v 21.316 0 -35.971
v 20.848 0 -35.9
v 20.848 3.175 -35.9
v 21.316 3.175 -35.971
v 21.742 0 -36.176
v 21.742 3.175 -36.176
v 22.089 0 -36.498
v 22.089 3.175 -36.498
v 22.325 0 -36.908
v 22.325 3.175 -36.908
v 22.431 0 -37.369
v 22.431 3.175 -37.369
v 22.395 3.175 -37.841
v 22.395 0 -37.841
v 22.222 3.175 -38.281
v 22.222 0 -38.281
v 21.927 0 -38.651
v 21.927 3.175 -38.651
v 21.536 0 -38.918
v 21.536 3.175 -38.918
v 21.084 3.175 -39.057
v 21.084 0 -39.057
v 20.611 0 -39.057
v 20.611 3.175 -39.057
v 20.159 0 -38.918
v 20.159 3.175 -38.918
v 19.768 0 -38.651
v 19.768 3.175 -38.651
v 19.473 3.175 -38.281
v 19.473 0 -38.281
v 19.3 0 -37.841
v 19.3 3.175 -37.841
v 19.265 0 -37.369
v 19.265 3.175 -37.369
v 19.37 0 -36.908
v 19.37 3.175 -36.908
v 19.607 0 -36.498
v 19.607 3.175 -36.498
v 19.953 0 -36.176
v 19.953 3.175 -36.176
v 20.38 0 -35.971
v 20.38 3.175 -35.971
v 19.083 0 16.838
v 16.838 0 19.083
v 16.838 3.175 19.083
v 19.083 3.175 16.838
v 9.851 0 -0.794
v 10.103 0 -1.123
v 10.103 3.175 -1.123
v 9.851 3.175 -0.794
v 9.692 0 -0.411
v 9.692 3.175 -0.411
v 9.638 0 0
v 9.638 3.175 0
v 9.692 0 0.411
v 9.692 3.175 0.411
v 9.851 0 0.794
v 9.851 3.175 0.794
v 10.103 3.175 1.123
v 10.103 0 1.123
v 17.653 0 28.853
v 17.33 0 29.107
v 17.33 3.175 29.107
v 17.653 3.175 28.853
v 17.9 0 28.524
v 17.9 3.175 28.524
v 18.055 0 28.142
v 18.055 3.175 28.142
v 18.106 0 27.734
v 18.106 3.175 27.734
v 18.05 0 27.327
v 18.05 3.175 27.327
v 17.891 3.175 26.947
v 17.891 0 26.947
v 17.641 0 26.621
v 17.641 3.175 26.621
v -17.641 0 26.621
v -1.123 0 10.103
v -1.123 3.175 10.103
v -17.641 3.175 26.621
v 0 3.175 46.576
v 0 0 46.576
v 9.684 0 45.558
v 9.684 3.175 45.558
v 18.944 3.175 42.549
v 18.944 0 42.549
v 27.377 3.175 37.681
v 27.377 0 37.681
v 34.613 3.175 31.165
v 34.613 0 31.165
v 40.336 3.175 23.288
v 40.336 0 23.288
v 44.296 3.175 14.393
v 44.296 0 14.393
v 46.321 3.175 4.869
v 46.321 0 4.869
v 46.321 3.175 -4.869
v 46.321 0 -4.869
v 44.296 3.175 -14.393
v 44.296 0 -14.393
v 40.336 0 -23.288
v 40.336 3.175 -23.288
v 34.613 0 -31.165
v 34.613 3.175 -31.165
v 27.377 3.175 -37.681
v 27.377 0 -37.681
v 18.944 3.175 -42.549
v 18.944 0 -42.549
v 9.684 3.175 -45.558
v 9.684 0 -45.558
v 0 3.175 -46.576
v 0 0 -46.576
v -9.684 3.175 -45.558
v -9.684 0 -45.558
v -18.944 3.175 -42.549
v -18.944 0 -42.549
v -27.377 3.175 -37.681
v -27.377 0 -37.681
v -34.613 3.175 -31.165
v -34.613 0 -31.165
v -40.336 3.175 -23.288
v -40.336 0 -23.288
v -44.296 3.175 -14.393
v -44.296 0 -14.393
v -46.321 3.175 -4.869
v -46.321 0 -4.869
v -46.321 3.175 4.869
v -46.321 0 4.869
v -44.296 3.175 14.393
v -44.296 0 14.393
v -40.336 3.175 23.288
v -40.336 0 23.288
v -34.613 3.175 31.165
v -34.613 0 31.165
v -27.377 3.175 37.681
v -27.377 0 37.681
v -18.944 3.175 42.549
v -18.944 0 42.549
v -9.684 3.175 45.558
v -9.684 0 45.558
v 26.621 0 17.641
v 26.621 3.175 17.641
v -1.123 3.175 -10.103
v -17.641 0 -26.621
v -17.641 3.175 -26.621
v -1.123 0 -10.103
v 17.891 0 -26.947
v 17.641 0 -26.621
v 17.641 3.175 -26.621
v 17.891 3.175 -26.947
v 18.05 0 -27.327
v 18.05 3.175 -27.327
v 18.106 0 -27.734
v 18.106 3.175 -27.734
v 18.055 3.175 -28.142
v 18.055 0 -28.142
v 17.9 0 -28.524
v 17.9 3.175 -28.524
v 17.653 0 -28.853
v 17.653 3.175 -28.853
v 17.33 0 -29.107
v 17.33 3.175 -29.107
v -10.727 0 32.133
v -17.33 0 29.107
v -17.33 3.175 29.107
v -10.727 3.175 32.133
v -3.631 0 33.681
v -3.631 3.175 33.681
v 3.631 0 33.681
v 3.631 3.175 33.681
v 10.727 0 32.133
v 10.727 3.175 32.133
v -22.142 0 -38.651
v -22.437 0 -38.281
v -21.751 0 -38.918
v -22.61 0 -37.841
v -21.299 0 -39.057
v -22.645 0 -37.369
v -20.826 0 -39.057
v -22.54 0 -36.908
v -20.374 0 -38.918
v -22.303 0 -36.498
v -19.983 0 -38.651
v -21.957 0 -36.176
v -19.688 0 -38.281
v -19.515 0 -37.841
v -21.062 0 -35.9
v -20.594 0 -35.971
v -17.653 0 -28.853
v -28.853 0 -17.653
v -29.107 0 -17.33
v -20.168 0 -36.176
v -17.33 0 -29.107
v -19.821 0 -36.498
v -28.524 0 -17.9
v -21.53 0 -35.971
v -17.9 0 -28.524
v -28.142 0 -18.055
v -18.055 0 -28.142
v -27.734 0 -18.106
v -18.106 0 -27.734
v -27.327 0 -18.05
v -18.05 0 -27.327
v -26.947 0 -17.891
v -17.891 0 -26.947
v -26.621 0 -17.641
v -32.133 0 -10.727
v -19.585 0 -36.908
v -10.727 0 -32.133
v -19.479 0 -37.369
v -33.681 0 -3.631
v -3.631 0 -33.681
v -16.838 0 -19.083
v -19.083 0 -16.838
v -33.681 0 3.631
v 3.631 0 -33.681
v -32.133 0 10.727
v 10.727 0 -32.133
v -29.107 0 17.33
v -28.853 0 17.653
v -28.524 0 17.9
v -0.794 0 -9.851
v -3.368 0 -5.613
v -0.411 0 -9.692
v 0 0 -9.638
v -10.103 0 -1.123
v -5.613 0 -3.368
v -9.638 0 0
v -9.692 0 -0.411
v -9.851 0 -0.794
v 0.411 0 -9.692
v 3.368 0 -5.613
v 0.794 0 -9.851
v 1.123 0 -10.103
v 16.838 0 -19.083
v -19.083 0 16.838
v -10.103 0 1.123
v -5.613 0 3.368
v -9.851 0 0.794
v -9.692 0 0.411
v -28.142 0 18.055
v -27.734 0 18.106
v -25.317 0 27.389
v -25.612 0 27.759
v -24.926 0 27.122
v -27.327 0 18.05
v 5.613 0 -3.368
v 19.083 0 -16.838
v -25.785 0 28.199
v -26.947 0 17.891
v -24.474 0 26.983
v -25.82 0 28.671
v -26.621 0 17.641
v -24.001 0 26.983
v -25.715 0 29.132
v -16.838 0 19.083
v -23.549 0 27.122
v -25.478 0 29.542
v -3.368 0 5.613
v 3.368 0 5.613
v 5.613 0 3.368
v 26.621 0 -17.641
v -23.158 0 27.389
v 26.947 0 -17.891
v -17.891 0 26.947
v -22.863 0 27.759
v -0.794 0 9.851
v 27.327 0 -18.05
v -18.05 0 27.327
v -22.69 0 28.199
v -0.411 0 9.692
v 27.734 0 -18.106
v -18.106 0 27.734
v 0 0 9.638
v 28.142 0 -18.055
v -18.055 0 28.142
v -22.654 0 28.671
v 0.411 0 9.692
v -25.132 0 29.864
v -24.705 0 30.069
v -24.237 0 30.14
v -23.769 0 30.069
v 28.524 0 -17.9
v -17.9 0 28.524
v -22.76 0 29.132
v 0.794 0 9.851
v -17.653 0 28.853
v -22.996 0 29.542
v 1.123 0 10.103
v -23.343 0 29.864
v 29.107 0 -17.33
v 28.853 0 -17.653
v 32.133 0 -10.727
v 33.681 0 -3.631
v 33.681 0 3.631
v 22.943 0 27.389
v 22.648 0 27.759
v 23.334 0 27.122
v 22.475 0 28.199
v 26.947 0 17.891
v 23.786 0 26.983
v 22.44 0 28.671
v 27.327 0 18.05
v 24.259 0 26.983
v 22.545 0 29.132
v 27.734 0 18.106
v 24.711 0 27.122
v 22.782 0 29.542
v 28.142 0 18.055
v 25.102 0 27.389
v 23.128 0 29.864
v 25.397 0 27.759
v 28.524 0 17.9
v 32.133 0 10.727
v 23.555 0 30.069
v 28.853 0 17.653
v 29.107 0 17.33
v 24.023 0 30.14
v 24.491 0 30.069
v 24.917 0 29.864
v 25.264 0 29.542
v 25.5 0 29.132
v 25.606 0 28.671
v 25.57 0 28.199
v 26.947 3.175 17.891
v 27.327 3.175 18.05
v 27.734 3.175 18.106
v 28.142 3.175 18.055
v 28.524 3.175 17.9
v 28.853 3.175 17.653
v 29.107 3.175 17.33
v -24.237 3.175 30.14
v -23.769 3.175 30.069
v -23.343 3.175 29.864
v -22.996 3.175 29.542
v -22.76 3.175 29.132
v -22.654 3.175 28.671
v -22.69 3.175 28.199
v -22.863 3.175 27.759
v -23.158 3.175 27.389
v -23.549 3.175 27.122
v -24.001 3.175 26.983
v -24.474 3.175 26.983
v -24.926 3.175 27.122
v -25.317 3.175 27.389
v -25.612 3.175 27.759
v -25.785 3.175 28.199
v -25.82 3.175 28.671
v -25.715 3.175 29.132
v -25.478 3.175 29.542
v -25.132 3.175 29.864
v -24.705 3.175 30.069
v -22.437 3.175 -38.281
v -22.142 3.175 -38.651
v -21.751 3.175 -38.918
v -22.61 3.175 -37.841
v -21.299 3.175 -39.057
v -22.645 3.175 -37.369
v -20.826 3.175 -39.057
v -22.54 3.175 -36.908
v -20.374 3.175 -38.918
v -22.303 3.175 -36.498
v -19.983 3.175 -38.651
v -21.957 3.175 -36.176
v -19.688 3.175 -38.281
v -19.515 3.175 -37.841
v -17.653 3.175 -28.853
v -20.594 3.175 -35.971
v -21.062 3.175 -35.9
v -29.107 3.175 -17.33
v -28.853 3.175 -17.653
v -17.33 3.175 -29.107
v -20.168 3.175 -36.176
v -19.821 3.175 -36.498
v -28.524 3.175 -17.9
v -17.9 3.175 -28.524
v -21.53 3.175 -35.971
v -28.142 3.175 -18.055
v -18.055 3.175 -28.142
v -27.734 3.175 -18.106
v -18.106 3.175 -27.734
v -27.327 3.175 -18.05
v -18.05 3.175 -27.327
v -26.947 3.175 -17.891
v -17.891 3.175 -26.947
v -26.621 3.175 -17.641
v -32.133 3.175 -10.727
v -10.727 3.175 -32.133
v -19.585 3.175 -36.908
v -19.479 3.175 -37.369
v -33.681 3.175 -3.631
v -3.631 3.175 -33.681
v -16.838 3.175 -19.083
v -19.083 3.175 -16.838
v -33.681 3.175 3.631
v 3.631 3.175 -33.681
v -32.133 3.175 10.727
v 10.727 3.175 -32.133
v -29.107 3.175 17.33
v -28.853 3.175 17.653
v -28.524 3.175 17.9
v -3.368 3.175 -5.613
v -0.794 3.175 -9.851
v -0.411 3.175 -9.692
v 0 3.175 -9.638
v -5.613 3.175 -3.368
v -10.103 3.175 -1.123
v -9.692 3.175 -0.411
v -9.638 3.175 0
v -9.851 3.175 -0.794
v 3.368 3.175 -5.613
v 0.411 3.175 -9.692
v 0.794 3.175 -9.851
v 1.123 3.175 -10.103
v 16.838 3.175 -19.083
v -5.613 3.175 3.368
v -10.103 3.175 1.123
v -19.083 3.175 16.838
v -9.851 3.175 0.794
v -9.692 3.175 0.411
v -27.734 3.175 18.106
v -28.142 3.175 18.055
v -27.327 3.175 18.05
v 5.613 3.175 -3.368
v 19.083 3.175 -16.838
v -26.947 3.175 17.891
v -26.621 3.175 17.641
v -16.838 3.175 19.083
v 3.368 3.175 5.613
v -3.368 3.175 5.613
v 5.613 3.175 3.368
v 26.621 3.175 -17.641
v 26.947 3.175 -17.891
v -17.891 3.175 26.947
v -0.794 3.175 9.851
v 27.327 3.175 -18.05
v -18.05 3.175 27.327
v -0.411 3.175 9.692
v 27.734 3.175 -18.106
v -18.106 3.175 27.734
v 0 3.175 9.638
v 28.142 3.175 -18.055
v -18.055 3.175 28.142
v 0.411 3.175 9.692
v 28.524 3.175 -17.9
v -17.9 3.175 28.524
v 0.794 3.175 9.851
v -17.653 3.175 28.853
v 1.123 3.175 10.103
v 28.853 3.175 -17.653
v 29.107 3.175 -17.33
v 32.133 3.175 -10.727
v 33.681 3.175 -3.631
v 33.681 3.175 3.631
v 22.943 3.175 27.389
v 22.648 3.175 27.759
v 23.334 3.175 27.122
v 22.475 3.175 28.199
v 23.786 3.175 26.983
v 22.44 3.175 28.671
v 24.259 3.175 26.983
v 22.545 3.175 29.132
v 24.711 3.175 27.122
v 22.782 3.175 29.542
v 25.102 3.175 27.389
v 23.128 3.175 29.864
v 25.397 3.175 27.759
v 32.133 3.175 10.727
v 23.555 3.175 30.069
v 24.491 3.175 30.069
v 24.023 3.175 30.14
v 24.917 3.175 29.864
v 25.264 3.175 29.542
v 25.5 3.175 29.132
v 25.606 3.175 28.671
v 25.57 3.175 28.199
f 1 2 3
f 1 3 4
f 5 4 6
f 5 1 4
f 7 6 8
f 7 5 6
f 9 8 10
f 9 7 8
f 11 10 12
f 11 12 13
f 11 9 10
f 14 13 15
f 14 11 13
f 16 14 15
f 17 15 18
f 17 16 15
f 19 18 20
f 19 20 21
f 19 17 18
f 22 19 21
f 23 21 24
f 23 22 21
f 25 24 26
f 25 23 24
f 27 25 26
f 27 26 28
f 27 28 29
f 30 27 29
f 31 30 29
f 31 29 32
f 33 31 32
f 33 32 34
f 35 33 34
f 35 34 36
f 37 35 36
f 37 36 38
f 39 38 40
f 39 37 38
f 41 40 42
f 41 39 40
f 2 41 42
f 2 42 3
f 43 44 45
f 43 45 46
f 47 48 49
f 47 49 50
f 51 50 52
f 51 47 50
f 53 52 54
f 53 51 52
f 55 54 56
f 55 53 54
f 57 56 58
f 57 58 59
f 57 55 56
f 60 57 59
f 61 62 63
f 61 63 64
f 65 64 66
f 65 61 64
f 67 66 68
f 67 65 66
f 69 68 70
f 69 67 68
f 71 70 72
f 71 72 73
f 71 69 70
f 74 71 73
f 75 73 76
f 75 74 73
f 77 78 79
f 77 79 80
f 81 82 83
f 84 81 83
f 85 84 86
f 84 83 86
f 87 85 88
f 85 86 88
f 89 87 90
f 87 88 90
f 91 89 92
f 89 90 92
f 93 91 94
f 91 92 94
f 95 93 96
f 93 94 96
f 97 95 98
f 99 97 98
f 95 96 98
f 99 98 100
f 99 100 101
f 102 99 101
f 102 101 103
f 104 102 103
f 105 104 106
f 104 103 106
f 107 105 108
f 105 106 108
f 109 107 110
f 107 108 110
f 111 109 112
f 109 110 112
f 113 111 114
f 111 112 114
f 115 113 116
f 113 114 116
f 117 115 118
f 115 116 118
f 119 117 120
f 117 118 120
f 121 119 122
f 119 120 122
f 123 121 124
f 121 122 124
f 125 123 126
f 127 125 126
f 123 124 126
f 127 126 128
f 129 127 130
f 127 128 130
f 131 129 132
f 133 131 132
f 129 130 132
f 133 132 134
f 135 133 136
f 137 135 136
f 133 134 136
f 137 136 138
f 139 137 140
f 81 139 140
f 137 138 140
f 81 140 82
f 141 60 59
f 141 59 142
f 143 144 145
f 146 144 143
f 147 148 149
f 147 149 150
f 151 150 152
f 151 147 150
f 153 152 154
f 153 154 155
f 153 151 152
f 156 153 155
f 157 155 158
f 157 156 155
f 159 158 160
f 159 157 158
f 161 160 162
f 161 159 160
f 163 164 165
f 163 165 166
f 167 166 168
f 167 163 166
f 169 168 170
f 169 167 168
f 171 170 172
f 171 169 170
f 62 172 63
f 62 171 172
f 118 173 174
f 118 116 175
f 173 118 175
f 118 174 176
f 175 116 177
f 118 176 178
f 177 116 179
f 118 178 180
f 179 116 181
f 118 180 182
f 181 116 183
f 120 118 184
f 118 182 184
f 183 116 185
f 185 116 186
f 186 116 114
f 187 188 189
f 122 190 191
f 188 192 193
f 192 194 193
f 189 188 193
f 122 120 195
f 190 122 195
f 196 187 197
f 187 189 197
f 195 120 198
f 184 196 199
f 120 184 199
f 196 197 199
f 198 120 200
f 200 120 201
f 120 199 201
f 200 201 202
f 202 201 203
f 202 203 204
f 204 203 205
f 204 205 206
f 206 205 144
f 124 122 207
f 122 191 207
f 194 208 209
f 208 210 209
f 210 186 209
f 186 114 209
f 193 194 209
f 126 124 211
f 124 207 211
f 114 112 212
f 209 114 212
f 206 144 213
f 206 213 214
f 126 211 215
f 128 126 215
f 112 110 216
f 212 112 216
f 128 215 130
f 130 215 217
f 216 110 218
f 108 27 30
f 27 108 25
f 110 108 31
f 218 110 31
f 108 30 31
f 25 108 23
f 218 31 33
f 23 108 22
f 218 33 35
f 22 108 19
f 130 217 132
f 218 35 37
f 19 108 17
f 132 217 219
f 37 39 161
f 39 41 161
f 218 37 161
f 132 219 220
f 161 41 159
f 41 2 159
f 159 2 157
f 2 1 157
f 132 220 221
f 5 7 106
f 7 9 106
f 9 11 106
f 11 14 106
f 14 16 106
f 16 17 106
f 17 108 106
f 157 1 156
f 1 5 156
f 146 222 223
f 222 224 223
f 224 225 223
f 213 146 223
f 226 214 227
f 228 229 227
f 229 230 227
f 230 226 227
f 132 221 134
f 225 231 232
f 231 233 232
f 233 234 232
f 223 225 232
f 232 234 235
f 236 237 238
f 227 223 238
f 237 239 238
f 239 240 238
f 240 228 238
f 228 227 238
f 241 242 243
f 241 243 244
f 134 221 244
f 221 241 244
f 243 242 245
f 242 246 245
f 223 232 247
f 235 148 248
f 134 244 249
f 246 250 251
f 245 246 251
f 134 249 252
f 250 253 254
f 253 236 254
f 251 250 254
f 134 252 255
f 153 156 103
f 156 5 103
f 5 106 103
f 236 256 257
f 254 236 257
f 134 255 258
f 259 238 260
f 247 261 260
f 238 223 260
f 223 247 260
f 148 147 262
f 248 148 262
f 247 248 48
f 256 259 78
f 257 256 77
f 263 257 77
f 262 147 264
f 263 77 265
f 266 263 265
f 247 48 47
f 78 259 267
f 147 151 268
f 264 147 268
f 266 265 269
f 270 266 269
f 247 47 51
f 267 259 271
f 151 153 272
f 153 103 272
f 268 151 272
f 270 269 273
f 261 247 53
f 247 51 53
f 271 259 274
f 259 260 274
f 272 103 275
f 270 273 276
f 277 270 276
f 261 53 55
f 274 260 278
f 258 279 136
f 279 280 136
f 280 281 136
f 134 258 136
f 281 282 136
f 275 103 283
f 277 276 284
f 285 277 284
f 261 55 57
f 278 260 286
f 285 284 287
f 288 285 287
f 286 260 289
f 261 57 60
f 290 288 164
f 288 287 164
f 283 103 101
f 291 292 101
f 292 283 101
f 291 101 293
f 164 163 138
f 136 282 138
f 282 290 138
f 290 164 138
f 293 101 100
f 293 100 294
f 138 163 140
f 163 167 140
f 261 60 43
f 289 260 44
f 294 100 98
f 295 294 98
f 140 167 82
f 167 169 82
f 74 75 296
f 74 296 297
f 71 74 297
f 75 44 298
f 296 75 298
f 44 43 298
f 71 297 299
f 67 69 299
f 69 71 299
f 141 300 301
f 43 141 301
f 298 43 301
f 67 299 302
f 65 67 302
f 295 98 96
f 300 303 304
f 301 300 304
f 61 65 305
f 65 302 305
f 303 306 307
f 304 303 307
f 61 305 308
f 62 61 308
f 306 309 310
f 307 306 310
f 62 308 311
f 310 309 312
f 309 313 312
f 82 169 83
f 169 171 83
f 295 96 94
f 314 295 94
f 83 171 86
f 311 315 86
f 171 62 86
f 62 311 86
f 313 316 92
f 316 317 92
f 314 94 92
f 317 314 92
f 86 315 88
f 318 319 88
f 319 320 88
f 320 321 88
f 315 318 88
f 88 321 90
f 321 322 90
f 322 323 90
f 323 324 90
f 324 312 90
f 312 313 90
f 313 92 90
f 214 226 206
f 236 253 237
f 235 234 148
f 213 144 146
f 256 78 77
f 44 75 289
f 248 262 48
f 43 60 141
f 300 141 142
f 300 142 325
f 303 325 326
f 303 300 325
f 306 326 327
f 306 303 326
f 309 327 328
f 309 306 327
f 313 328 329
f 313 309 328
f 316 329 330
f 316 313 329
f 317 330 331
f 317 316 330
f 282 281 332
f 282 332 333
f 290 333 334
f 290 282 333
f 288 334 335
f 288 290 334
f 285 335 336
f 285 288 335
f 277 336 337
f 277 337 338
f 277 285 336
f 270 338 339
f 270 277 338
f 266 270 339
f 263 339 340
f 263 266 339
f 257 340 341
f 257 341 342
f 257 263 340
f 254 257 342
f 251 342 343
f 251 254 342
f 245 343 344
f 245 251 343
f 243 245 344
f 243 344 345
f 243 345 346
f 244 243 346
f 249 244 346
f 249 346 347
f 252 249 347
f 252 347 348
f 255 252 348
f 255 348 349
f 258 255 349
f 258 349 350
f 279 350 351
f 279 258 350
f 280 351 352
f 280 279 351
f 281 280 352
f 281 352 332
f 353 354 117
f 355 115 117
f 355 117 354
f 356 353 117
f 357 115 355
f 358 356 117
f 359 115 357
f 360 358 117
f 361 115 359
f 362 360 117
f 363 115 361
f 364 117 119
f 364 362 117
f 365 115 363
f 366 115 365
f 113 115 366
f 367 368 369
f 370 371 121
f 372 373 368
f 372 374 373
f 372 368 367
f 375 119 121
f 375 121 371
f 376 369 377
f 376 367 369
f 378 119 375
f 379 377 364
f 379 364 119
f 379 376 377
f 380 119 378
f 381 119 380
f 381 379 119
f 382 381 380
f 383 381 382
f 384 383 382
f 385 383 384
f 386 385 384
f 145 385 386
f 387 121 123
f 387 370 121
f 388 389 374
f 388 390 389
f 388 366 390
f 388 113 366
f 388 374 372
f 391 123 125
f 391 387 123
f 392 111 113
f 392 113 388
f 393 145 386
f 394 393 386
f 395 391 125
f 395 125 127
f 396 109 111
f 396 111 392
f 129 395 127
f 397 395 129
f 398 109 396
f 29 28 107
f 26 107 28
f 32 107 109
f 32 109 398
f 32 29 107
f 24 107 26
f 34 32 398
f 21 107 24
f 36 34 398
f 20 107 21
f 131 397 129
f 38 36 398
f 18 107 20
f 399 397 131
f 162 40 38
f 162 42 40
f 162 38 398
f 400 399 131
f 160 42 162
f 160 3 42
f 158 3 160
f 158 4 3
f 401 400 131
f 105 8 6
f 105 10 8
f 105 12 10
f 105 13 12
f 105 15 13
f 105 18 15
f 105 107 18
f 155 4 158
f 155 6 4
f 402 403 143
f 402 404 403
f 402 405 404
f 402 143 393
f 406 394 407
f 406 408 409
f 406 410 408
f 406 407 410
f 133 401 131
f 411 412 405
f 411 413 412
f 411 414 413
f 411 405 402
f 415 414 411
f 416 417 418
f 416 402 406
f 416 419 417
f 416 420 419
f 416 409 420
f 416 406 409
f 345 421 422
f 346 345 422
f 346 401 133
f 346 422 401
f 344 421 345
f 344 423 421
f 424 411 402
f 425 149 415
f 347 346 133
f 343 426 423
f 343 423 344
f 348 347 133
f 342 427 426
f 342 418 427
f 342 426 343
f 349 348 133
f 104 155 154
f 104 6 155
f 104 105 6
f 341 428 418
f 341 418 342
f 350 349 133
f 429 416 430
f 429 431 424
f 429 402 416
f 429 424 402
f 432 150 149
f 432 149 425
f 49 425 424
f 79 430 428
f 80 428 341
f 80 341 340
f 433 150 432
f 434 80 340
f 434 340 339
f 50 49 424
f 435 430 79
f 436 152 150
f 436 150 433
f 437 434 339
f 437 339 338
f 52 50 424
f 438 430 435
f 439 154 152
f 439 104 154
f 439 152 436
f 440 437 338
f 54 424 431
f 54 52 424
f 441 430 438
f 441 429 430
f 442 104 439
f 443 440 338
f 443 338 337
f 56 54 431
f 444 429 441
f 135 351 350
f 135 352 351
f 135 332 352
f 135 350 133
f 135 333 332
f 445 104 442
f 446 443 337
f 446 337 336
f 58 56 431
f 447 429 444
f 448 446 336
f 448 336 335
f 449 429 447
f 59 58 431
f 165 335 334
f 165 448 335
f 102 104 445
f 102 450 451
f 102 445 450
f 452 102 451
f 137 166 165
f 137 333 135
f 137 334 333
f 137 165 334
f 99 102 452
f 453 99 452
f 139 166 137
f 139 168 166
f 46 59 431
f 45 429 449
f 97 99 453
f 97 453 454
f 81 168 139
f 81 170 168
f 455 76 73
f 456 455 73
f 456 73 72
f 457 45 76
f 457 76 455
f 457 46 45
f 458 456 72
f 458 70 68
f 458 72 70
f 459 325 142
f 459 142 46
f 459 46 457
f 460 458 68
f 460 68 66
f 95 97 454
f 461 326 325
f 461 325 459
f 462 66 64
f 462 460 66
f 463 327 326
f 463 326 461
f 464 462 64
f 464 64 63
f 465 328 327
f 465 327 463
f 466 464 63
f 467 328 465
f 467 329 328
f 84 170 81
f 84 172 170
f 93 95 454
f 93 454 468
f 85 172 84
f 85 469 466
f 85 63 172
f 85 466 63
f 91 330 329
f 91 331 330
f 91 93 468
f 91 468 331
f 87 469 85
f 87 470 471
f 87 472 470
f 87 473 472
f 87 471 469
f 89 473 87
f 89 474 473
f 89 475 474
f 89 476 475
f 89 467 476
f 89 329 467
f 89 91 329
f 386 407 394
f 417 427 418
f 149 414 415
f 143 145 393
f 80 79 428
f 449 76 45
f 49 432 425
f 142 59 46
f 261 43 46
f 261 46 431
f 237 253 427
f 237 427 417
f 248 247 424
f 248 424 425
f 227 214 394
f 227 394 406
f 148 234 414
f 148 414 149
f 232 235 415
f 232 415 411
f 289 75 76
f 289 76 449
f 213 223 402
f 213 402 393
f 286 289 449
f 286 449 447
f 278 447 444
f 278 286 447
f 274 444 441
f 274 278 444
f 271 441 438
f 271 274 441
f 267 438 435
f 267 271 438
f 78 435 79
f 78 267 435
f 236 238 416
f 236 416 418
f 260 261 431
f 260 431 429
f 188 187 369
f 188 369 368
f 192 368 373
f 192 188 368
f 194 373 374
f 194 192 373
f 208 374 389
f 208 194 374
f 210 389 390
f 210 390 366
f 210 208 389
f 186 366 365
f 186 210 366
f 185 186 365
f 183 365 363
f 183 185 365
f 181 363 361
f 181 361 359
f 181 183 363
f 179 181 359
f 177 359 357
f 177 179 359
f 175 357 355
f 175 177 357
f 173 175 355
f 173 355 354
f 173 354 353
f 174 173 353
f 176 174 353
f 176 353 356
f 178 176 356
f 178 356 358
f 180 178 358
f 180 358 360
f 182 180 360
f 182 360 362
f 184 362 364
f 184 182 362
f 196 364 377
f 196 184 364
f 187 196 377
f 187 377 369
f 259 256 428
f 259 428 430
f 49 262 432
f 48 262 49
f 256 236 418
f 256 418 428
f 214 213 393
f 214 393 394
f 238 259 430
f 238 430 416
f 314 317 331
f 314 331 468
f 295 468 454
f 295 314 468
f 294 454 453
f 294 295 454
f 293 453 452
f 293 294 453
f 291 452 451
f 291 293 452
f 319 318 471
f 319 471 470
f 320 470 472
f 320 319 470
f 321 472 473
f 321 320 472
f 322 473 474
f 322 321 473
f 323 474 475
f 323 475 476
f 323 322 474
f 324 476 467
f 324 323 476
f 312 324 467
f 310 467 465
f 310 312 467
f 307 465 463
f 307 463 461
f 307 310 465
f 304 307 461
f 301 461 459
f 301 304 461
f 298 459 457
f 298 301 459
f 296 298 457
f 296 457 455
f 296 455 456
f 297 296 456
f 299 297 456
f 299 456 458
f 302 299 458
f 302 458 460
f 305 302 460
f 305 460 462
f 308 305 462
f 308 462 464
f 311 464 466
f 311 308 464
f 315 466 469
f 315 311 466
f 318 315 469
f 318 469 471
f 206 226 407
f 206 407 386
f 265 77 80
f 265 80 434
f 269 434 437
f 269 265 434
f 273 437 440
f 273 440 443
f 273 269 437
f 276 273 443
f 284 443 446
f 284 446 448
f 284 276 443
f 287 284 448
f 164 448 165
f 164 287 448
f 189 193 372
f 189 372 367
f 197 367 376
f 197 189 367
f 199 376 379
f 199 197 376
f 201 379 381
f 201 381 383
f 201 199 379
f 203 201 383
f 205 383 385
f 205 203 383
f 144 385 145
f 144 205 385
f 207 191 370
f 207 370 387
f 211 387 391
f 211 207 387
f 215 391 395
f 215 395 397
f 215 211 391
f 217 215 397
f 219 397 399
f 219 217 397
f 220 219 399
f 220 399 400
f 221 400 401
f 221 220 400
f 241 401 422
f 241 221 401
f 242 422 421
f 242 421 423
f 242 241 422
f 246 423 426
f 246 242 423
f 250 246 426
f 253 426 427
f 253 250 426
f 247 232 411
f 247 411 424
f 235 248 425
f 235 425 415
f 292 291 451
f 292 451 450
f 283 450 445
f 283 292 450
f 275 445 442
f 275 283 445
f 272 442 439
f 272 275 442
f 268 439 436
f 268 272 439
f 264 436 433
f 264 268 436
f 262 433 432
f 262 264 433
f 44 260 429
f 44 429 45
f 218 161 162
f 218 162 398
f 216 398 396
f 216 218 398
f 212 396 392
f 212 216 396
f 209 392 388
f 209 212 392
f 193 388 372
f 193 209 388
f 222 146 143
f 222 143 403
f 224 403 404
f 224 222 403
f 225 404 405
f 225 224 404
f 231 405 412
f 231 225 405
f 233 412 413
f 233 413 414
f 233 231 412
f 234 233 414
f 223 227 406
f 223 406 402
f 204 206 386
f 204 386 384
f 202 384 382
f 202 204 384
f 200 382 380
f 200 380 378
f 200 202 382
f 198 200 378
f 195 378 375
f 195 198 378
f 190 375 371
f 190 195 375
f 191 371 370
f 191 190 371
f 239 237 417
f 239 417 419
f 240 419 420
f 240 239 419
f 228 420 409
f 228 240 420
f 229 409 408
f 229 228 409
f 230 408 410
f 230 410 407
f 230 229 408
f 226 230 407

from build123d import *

# Parameters (mm, degrees)
SKETCH1_R           = 46.575911122
SKETCH1_R_2         = 1.5875
SKETCH1_R_3         = 1.587499998
BOSS_EXTRUDE1_DEPTH = 3.175


with BuildPart() as part:
    # Sketch1 → Boss-Extrude1 (new body)
    with BuildSketch(Plane(origin=(0, 0, 0), x_dir=(1, 0, 0), z_dir=(0, 1, 0))):
        with Locations(Location((-1e-09, 0, 0), (0, 0, 270))):
            Circle(SKETCH1_R)
        with Locations(Location((24.022660032, -28.55227459, 0), (0, 0, 270))):
            Circle(SKETCH1_R_2, mode=Mode.SUBTRACT)
        with Locations(Location((-24.237339968, -28.55227459, 0), (0, 0, 270))):
            Circle(SKETCH1_R_3, mode=Mode.SUBTRACT)
        with Locations(Location((-21.062339968, 37.48772541, 0), (0, 0, 270))):
            Circle(SKETCH1_R_2, mode=Mode.SUBTRACT)
        with Locations(Location((20.847660032, 37.48772541, 0), (0, 0, 270))):
            Circle(SKETCH1_R_2, mode=Mode.SUBTRACT)
        with BuildLine():
            Line((-1.12253199, -10.1027881), (-17.640592509, -26.62084862))
            ThreePointArc((-17.640592509, -26.62084862), (-18.09333437, -27.940023623), (-17.330191539, -29.107418543))
            ThreePointArc((-17.330191539, -29.107418543), (1.9e-08, -33.875911102), (17.330191572, -29.107418523))
            ThreePointArc((17.330191572, -29.107418523), (18.093334404, -27.940023602), (17.640592543, -26.620848599))
            Line((17.640592543, -26.620848599), (1.12253204, -10.1027881))
            ThreePointArc((1.12253204, -10.1027881), (2.5e-08, -9.637820115), (-1.12253199, -10.1027881))
        make_face(mode=Mode.SUBTRACT)
        with BuildLine():
            Line((-10.102788112, 1.122532053), (-26.6208486, 17.640592539))
            ThreePointArc((-26.6208486, 17.640592539), (-27.940023602, 18.093334401), (-29.107418522, 17.330191571))
            ThreePointArc((-29.107418522, 17.330191571), (-33.875911101, 2.9e-08), (-29.107418553, -17.330191521))
            ThreePointArc((-29.107418553, -17.330191521), (-27.940023632, -18.093334356), (-26.620848627, -17.640592494))
            Line((-26.620848627, -17.640592494), (-10.102788113, -1.122531976))
            ThreePointArc((-10.102788113, -1.122531976), (-9.637820128, 3.8e-08), (-10.102788112, 1.122532053))
        make_face(mode=Mode.SUBTRACT)
        with BuildLine():
            Line((1.122532046, 10.102788181), (17.640592494, 26.620848628))
            ThreePointArc((17.640592494, 26.620848628), (18.093334353, 27.940023632), (17.33019152, 29.107418551))
            ThreePointArc((17.33019152, 29.107418551), (2.4e-08, 33.8759111), (-17.33019148, 29.107418577))
            ThreePointArc((-17.33019148, 29.107418577), (-18.093334314, 27.940023657), (-17.640592454, 26.620848652))
            Line((-17.640592454, 26.620848652), (-1.122531984, 10.102788181))
            ThreePointArc((-1.122531984, 10.102788181), (3.1e-08, 9.637820197), (1.122532046, 10.102788181))
        make_face(mode=Mode.SUBTRACT)
        with BuildLine():
            Line((26.620848619, 17.64059251), (10.102788169, 1.12253206))
            ThreePointArc((10.102788169, 1.12253206), (9.637820183, 4.4e-08), (10.102788168, -1.122531972))
            Line((10.102788168, -1.122531972), (26.620848653, -17.640592453))
            ThreePointArc((26.620848653, -17.640592453), (27.940023657, -18.093334314), (29.107418578, -17.33019148))
            ThreePointArc((29.107418578, -17.33019148), (33.875911102, 3.4e-08), (29.107418542, 17.330191539))
            ThreePointArc((29.107418542, 17.330191539), (27.940023622, 18.09333437), (26.620848619, 17.64059251))
        make_face(mode=Mode.SUBTRACT)
        Polygon((-19.083044242, -16.837980228), (-16.837980211, -19.083044257), (-3.367596019, -5.612660086), (-5.61266005, -3.367596056), align=None, mode=Mode.SUBTRACT)
        Polygon((16.837980228, -19.083044242), (19.083044257, -16.837980211), (5.612660086, -3.367596019), (3.367596056, -5.61266005), align=None, mode=Mode.SUBTRACT)
        Polygon((19.083044242, 16.837980228), (16.837980211, 19.083044257), (3.367596019, 5.612660086), (5.61266005, 3.367596056), align=None, mode=Mode.SUBTRACT)
        Polygon((-16.837980228, 19.083044242), (-19.083044257, 16.837980211), (-5.612660086, 3.367596019), (-3.367596056, 5.61266005), align=None, mode=Mode.SUBTRACT)
    extrude(amount=BOSS_EXTRUDE1_DEPTH)


solid = part.part
